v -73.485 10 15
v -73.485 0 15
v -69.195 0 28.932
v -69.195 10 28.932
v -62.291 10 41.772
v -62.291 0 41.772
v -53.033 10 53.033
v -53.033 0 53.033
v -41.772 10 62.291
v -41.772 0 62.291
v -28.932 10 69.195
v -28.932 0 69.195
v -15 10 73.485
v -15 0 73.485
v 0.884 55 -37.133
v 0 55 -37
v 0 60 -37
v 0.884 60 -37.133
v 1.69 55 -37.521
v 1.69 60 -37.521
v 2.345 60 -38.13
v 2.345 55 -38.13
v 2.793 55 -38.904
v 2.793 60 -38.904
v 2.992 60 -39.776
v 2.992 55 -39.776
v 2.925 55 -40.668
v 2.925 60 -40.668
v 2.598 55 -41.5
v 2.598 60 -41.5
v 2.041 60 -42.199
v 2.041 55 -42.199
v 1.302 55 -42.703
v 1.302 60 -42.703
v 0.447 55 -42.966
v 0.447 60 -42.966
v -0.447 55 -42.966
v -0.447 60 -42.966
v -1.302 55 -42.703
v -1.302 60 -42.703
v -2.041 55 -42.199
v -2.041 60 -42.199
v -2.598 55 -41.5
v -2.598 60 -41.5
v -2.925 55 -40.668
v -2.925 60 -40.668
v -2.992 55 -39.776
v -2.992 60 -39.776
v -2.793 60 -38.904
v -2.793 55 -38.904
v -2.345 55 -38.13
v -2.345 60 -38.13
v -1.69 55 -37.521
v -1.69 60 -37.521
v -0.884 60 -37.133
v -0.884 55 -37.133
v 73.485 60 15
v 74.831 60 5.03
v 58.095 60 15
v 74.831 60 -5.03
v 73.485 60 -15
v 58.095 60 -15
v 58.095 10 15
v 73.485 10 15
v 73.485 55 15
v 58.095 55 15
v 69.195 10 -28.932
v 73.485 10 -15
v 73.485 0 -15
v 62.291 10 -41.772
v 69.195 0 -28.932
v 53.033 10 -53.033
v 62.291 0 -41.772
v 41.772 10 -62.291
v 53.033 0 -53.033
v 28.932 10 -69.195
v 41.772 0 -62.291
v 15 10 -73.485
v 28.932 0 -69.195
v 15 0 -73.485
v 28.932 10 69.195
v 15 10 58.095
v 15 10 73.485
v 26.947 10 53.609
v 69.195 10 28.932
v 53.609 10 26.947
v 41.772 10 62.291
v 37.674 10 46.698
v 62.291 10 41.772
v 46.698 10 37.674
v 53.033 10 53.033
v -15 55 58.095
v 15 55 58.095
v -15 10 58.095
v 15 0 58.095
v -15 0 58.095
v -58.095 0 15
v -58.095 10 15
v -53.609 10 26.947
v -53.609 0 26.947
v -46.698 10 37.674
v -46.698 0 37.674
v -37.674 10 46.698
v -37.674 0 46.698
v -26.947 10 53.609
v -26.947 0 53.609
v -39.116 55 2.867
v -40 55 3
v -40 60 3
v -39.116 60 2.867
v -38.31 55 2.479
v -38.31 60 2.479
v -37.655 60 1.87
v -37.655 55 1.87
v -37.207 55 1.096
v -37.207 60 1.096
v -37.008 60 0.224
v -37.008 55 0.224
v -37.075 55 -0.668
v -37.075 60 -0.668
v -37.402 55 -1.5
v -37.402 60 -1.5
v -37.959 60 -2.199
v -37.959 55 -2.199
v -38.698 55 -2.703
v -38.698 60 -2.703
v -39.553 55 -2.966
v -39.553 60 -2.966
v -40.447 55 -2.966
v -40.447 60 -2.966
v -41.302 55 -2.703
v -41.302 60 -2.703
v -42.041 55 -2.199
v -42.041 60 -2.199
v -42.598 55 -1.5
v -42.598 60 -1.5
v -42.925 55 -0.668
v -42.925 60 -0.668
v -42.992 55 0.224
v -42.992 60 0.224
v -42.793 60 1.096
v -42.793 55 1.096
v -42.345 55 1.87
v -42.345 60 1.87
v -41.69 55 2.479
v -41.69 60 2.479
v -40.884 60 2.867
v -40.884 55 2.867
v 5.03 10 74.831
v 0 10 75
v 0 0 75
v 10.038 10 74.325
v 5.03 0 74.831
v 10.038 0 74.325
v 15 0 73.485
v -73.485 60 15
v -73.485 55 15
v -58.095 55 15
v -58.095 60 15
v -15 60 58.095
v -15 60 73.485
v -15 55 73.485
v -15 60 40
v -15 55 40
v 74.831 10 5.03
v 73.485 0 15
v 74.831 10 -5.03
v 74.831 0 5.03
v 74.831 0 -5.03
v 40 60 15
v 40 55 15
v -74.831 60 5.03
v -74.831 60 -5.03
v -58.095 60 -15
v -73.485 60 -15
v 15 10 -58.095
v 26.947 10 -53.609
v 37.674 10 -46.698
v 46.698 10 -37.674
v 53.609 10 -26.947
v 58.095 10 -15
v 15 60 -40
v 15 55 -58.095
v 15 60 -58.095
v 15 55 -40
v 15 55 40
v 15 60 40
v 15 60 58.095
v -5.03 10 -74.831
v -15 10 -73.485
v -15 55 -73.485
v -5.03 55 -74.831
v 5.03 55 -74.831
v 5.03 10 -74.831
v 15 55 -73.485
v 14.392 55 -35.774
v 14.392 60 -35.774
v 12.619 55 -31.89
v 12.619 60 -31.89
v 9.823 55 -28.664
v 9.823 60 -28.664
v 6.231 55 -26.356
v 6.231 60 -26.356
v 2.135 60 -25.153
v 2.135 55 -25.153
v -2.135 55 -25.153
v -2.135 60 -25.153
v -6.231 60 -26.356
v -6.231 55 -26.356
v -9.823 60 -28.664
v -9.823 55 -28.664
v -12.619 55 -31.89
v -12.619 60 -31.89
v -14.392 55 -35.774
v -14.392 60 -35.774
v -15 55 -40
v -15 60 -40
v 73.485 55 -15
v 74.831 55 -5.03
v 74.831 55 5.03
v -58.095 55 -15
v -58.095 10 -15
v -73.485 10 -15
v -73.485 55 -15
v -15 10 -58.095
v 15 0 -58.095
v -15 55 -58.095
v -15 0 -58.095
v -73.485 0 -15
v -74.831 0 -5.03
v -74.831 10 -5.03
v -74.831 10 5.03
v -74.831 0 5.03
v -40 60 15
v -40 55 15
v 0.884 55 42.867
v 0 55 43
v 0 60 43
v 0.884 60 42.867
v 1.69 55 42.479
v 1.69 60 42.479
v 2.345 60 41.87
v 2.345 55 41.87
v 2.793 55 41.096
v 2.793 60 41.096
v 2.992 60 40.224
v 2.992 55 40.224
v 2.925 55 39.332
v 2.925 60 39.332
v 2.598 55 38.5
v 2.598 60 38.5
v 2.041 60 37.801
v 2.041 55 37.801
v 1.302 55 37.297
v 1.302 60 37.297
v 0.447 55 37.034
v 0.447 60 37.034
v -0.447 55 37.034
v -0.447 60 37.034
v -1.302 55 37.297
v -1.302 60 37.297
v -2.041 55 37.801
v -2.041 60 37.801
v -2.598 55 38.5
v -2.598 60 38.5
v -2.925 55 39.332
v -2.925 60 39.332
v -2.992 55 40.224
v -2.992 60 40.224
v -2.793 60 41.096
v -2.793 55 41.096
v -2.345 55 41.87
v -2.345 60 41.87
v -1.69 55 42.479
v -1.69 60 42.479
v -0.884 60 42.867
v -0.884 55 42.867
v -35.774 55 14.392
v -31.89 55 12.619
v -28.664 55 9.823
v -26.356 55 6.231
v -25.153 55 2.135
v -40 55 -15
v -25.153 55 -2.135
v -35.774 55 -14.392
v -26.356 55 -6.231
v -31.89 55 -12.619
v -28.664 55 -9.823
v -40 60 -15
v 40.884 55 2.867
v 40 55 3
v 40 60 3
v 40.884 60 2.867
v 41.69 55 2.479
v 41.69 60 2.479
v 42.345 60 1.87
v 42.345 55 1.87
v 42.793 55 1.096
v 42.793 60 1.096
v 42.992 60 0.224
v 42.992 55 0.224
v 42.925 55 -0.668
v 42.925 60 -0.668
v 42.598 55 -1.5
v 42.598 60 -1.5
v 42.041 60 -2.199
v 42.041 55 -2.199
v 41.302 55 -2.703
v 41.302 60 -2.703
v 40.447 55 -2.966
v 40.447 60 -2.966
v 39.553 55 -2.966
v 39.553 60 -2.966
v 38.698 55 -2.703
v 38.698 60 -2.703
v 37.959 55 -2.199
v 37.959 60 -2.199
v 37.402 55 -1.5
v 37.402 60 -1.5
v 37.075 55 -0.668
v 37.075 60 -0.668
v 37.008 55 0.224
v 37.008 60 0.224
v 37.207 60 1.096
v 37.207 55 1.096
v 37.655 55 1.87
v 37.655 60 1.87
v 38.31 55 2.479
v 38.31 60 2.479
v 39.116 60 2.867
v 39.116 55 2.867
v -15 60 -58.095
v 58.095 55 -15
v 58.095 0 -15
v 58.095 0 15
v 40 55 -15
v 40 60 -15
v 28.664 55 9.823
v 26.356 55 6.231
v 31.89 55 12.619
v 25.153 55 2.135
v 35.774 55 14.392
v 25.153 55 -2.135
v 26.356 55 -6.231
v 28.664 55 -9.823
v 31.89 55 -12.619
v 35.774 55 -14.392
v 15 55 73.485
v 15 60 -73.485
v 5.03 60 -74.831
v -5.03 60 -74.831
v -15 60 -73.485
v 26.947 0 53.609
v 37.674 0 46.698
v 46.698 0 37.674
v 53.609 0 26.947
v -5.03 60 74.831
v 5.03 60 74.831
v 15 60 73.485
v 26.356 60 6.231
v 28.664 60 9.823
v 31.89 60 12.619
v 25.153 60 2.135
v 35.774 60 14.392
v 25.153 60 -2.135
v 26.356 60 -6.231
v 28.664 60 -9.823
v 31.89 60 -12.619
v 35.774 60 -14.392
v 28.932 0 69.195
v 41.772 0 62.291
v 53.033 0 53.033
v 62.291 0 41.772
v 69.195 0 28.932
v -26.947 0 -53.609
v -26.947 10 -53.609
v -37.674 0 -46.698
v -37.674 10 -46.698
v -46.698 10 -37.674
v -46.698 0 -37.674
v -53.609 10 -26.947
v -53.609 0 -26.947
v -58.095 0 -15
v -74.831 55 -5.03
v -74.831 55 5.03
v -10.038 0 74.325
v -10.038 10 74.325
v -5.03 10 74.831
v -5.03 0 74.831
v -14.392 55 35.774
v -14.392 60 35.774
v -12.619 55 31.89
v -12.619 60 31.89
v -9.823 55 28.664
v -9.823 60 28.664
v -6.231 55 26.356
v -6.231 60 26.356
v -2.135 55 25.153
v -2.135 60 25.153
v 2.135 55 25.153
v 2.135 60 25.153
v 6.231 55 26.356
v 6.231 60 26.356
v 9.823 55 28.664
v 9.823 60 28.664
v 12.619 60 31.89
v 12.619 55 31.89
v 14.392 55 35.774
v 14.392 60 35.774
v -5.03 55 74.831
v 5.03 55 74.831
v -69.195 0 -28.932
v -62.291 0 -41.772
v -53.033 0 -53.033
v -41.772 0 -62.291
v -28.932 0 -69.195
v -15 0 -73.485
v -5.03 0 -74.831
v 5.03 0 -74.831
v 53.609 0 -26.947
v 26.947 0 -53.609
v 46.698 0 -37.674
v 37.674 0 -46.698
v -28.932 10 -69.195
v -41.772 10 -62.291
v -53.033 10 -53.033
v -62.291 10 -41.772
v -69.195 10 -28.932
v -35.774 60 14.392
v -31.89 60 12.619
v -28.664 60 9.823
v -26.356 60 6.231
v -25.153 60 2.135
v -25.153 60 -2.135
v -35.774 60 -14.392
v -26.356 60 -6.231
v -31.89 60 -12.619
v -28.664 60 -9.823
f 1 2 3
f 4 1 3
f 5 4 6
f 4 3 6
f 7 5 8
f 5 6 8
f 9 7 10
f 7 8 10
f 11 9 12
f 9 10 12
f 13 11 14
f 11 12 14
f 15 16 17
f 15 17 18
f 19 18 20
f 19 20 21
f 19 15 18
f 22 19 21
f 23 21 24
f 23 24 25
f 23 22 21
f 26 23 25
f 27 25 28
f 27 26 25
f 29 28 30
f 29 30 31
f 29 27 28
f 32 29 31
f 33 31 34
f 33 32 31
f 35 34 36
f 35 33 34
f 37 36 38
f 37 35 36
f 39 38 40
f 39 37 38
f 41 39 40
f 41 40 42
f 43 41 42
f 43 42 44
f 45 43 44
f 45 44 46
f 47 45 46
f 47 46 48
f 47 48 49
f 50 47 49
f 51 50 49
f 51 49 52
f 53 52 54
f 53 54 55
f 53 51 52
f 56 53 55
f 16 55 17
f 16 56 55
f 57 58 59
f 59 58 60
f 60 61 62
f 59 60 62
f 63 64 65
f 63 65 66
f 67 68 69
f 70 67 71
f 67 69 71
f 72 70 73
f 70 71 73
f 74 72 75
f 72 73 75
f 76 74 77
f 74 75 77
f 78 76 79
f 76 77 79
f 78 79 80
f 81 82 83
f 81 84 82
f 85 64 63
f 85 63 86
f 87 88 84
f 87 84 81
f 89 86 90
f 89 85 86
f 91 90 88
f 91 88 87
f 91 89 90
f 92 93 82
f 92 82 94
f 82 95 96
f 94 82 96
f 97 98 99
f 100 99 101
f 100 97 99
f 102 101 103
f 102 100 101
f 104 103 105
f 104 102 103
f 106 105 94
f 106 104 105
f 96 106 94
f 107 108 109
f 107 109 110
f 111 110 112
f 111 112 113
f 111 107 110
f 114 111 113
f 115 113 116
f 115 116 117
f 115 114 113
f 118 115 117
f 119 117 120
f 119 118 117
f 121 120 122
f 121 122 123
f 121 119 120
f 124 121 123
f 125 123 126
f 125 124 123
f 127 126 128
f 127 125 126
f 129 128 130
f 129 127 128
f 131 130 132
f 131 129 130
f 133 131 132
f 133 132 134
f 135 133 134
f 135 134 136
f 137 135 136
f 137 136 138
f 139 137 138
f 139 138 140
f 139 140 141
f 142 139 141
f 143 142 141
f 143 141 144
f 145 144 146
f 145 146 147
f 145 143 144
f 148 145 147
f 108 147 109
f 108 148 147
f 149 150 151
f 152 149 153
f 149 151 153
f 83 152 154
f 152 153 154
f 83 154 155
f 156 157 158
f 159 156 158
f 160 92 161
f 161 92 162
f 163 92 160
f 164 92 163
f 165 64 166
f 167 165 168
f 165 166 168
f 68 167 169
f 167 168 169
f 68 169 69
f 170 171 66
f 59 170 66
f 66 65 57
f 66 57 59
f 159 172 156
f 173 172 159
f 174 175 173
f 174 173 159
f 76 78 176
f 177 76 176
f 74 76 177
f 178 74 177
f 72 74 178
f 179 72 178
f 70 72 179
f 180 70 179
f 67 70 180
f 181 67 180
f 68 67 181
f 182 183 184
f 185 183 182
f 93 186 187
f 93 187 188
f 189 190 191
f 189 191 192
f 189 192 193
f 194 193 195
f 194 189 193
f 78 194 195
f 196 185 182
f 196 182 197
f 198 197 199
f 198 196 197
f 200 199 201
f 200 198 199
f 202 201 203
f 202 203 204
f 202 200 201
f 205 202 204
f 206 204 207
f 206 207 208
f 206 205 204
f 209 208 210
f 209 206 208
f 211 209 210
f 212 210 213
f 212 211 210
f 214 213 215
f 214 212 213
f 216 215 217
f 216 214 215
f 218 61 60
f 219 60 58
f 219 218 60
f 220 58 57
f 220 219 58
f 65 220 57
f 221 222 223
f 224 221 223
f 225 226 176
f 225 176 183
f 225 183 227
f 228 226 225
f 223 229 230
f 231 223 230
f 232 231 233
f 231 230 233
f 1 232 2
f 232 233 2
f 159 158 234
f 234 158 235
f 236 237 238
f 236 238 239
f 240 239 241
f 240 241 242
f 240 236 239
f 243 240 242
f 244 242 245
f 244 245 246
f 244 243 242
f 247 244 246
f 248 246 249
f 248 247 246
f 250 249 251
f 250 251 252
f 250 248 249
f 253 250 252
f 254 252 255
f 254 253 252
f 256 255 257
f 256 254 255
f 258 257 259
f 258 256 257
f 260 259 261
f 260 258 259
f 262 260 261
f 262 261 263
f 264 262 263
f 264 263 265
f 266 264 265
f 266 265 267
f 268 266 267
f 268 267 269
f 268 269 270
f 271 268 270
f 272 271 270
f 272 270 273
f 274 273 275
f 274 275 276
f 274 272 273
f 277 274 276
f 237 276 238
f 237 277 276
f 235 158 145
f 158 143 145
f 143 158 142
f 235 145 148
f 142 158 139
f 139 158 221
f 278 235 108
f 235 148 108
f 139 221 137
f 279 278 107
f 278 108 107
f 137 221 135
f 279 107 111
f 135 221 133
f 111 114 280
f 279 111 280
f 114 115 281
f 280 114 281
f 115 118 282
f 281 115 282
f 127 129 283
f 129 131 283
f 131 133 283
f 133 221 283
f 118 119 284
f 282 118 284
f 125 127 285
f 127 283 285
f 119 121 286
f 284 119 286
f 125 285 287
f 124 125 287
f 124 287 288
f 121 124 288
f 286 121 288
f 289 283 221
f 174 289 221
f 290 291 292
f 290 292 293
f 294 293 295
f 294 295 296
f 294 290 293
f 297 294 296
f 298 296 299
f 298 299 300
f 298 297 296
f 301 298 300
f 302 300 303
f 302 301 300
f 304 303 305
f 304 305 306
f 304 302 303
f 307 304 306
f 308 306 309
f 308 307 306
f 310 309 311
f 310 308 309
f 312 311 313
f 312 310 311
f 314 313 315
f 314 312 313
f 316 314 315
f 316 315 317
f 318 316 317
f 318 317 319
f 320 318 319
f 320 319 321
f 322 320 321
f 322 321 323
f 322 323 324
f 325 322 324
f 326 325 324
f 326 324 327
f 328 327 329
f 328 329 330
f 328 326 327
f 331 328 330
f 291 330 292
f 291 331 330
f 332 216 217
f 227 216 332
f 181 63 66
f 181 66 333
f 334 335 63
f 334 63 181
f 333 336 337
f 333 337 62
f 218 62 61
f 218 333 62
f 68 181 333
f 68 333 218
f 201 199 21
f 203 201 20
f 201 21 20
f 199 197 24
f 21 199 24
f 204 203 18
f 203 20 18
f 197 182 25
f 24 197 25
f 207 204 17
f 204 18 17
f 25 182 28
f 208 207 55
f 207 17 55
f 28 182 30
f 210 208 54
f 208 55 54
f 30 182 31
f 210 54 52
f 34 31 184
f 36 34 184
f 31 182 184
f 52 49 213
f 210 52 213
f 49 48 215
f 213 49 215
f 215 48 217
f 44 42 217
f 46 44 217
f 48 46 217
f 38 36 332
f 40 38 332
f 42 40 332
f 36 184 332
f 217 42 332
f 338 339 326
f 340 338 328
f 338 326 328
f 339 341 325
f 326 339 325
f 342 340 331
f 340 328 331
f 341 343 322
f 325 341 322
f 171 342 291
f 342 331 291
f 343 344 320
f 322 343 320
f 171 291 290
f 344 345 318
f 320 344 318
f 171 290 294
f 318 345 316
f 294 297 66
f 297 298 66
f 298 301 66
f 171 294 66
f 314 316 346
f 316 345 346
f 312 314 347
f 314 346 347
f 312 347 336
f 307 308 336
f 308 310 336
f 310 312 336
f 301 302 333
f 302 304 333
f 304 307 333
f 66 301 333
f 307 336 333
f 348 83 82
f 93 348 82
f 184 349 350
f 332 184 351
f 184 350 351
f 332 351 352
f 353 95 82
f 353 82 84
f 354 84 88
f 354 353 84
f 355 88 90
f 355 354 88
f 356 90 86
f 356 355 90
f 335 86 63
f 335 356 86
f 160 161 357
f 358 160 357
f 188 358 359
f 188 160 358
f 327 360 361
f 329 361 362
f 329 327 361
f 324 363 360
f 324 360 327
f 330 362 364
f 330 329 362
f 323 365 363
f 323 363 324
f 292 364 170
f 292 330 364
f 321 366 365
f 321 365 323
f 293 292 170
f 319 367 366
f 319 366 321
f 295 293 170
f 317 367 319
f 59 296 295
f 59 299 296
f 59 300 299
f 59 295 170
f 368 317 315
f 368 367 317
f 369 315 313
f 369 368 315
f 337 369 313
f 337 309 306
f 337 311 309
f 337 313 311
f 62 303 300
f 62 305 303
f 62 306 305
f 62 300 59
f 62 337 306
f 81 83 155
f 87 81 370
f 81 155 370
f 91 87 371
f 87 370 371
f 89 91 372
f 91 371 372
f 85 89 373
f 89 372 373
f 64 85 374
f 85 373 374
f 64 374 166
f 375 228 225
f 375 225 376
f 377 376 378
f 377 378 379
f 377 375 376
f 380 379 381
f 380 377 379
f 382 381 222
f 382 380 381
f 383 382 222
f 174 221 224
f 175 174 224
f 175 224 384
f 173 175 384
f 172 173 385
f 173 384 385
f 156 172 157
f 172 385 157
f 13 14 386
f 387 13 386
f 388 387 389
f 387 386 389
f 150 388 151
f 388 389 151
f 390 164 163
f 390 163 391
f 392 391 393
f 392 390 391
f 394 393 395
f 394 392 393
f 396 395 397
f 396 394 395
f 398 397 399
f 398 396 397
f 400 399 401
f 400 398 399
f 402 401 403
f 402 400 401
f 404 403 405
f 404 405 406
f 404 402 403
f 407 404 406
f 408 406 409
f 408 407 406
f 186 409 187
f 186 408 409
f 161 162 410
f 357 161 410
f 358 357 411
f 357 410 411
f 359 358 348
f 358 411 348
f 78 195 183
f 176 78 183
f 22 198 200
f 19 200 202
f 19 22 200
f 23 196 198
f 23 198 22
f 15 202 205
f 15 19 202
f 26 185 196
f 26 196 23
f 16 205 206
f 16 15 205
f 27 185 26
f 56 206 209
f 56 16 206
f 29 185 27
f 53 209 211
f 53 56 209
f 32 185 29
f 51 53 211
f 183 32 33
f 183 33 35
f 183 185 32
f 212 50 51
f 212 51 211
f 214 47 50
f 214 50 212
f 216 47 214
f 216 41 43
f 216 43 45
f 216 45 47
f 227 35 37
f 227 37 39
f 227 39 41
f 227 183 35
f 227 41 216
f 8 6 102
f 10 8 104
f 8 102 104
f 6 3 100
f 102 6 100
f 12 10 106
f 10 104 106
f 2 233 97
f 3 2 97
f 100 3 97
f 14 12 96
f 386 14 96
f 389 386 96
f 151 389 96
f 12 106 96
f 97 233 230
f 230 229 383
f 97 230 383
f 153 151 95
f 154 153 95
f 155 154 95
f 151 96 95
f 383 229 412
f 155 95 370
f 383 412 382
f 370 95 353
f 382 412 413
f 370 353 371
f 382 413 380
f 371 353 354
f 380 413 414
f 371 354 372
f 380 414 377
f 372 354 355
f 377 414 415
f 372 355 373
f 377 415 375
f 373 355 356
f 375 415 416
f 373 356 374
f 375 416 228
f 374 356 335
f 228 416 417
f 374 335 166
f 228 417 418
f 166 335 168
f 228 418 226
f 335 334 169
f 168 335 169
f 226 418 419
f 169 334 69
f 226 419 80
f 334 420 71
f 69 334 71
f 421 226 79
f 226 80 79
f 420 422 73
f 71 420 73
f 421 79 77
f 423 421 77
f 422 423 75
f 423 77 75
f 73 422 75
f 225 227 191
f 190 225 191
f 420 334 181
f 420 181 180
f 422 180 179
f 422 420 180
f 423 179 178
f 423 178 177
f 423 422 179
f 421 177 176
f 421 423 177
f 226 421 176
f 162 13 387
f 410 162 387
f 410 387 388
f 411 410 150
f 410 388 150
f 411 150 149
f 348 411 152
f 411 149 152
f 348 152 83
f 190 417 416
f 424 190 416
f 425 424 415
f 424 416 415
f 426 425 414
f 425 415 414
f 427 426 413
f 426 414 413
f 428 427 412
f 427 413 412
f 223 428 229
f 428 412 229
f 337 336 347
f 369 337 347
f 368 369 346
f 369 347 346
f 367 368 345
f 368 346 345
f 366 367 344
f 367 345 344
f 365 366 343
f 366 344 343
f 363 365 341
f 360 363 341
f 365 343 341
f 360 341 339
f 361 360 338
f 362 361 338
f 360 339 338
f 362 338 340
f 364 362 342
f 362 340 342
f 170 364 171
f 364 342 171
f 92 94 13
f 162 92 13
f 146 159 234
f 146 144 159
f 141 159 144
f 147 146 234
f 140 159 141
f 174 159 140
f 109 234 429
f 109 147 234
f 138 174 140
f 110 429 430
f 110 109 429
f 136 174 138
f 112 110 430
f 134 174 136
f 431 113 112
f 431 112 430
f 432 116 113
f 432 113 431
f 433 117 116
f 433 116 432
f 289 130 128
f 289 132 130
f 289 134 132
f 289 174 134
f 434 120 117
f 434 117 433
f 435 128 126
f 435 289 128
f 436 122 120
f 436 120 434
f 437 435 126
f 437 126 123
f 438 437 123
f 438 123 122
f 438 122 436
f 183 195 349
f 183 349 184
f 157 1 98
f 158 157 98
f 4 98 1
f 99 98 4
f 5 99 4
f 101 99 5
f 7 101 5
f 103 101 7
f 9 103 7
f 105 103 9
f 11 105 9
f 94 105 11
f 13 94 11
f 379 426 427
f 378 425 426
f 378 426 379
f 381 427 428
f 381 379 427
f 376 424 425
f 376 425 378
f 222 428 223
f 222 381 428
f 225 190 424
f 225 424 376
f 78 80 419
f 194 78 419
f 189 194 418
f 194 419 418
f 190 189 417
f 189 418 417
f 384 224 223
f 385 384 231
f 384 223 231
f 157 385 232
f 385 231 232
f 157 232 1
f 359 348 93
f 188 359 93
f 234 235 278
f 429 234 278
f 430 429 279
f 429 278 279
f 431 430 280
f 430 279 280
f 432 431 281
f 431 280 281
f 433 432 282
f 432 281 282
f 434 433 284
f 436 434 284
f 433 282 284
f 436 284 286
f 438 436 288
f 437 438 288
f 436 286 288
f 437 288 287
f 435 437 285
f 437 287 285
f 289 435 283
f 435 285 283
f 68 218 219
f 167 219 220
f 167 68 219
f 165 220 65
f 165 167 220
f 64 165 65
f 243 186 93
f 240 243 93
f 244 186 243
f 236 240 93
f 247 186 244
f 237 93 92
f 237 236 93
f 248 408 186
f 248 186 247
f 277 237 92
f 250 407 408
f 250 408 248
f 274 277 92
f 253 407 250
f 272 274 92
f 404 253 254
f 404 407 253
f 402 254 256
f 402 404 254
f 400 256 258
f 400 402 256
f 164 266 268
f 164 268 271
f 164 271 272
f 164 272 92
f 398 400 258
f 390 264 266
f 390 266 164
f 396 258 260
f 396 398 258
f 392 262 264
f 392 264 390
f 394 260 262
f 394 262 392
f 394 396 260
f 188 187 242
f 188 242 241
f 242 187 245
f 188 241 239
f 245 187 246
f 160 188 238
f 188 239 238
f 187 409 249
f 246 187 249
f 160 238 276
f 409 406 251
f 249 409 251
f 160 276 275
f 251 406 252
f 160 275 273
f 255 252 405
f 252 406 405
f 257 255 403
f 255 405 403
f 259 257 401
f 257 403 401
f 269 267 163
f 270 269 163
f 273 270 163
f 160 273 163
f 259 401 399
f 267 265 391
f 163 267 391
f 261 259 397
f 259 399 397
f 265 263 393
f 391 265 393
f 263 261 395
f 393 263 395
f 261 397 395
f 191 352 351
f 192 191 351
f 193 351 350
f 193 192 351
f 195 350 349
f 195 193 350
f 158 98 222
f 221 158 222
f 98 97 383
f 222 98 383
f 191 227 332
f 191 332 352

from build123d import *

# Parameters (mm, degrees)
SKETCH_1_R      = 75.00000000000001
SKETCH_1_R_2    = 60
EXTRUDE_1_DEPTH = 10
EXTRUDE_2_DEPTH = 60
EXTRUDE_START   = 55
SKETCH_3_R      = 3.0000000000000013
SKETCH_3_R_2    = 2.99999999999996
SKETCH_3_R_3    = 2.999999999999895
EXTRUDE_3_DEPTH = 5


with BuildPart() as part:
    # 草图1 → 凸台-拉伸1 (new body)
    with BuildSketch(Plane(origin=(0, 0, 0), x_dir=(1, 0, 0), z_dir=(0, 1, 0))):
        with Locations(Location((0, 0, 0), (0, 0, 270))):
            Circle(SKETCH_1_R)
        with Locations(Location((0, 0, 0), (0, 0, 270))):
            Circle(SKETCH_1_R_2, mode=Mode.SUBTRACT)
    extrude(amount=EXTRUDE_1_DEPTH)

    # 草图2 → 凸台-拉伸2 (add)
    with BuildSketch(Plane(origin=(0, 0, 0), x_dir=(1, 0, 0), z_dir=(0, 1, 0))):
        with BuildLine():
            Line((-58.09475019311125, -15), (-58.09475019311125, 15))
            Line((-58.09475019311125, 15), (-73.48469228349538, 15))
            ThreePointArc((-73.48469228349538, 15), (-75.00000000000003, 9.18e-15), (-73.48469228349538, -15))
            Line((-73.48469228349538, -15), (-58.09475019311125, -15))
        make_face()
        with BuildLine():
            Line((-14.999999999999652, -58.09475019311137), (-14.99999999999975, -73.48469228349562))
            ThreePointArc((-14.99999999999975, -73.48469228349562), (3.8762e-13, -75.00000000000017), (15.0000000000005, -73.48469228349542))
            Line((15.0000000000005, -73.48469228349542), (15.000000000000375, -58.0947501931114))
            Line((15.000000000000375, -58.0947501931114), (-14.999999999999652, -58.09475019311137))
        make_face()
        with BuildLine():
            Line((58.094750193111345, -14.999999999999556), (58.09475019311114, 15.000000000000444))
            Line((58.09475019311114, 15.000000000000444), (73.48469228349526, 15.000000000000444))
            ThreePointArc((73.48469228349526, 15.000000000000444), (75.00000000000001, 4.5589e-13), (73.48469228349548, -14.999999999999556))
            Line((73.48469228349548, -14.999999999999556), (58.094750193111345, -14.999999999999556))
        make_face()
        with BuildLine():
            Line((-14.999999999999833, 58.09475019311096), (-14.999999999999943, 73.4846922834952))
            ThreePointArc((-14.999999999999943, 73.4846922834952), (2.7105e-13, 75.00000000000016), (15.000000000000528, 73.48469228349539))
            Line((15.000000000000528, 73.48469228349539), (15.00000000000043, 58.09475019311115))
            Line((15.00000000000043, 58.09475019311115), (-14.999999999999833, 58.09475019311096))
        make_face()
    extrude(amount=EXTRUDE_2_DEPTH)

    # 草图3 → 凸台-拉伸3 (add)
    # profile 1 of 4: a face of its own
    with BuildSketch(Plane(origin=(0, 0, 0), x_dir=(1, 0, 0), z_dir=(0, 1, 0)).offset(EXTRUDE_START)):
        with BuildLine():
            Line((73.48469228349529, 15.000000000000448), (58.09475019311114, 15.000000000000444))
            Line((58.09475019311114, 15.000000000000444), (40, 15.000000000000014))
            ThreePointArc((40, 15.000000000000014), (25, 1.653e-14), (40, -14.999999999999986))
            Line((40, -14.999999999999986), (58.094750193111345, -14.999999999999556))
            Line((58.094750193111345, -14.999999999999556), (73.48469228349545, -14.999999999999556))
            ThreePointArc((73.48469228349545, -14.999999999999556), (75.00000000000001, 4.5172e-13), (73.48469228349529, 15.000000000000448))
        make_face()
        with Locations(Location((40, 1.47e-14, 0), (0, 0, 270))):
            Circle(SKETCH_3_R, mode=Mode.SUBTRACT)
    # profile 2 of 4: a face of its own
    with BuildSketch(Plane(origin=(0, 0, 0), x_dir=(1, 0, 0), z_dir=(0, 1, 0)).offset(EXTRUDE_START)):
        with BuildLine():
            Line((-73.48469228349538, -14.999999999999998), (-58.09475019311125, -15))
            Line((-58.09475019311125, -15), (-40, -15))
            ThreePointArc((-40, -15), (-25, 0), (-40, 15))
            Line((-40, 15), (-58.09475019311125, 15))
            Line((-58.09475019311125, 15), (-73.48469228349538, 15))
            ThreePointArc((-73.48469228349538, 15), (-75.00000000000003, 9.18e-15), (-73.48469228349538, -14.999999999999998))
        make_face()
        with Locations(Location((-40, 0, 0), (0, 0, 270))):
            Circle(SKETCH_3_R, mode=Mode.SUBTRACT)
    # profile 3 of 4: a face of its own
    with BuildSketch(Plane(origin=(0, 0, 0), x_dir=(1, 0, 0), z_dir=(0, 1, 0)).offset(EXTRUDE_START)):
        with BuildLine():
            Line((-14.999999999999833, 58.09475019311096), (-14.99999999999975, 73.4846922834952))
            ThreePointArc((-14.99999999999975, 73.4846922834952), (3.7097e-13, 74.99999999999982), (15.000000000000554, 73.48469228349539))
            Line((15.000000000000554, 73.48469228349539), (15.00000000000043, 58.09475019311115))
            Line((15.00000000000043, 58.09475019311115), (14.999999999999867, 39.99999999999992))
            ThreePointArc((14.999999999999867, 39.99999999999992), (6.281e-14, 25.00000000000015), (-15.00000000000016, 39.99999999999973))
            Line((-15.00000000000016, 39.99999999999973), (-14.999999999999833, 58.09475019311096))
        make_face()
        with Locations(Location((-3.469e-14, 40.00000000000005, 0), (0, 0, 270))):
            Circle(SKETCH_3_R_2, mode=Mode.SUBTRACT)
    # profile 4 of 4: a face of its own
    with BuildSketch(Plane(origin=(0, 0, 0), x_dir=(1, 0, 0), z_dir=(0, 1, 0)).offset(EXTRUDE_START)):
        with BuildLine():
            Line((-14.999999999999652, -58.09475019311137), (-14.999999999999867, -40.000000000000135))
            ThreePointArc((-14.999999999999867, -40.000000000000135), (2.6731e-13, -24.99999999999991), (15.00000000000016, -40.00000000000016))
            Line((15.00000000000016, -40.00000000000016), (15.000000000000375, -58.0947501931114))
            Line((15.000000000000375, -58.0947501931114), (15.0000000000005, -73.48469228349542))
            ThreePointArc((15.0000000000005, -73.48469228349542), (3.8762e-13, -75.00000000000017), (-14.99999999999975, -73.48469228349562))
            Line((-14.99999999999975, -73.48469228349562), (-14.999999999999652, -58.09475019311137))
        make_face()
        with Locations(Location((2.5674e-13, -40.000000000000036, 0), (0, 0, 270))):
            Circle(SKETCH_3_R_3, mode=Mode.SUBTRACT)
    extrude(amount=EXTRUDE_3_DEPTH)


solid = part.part
